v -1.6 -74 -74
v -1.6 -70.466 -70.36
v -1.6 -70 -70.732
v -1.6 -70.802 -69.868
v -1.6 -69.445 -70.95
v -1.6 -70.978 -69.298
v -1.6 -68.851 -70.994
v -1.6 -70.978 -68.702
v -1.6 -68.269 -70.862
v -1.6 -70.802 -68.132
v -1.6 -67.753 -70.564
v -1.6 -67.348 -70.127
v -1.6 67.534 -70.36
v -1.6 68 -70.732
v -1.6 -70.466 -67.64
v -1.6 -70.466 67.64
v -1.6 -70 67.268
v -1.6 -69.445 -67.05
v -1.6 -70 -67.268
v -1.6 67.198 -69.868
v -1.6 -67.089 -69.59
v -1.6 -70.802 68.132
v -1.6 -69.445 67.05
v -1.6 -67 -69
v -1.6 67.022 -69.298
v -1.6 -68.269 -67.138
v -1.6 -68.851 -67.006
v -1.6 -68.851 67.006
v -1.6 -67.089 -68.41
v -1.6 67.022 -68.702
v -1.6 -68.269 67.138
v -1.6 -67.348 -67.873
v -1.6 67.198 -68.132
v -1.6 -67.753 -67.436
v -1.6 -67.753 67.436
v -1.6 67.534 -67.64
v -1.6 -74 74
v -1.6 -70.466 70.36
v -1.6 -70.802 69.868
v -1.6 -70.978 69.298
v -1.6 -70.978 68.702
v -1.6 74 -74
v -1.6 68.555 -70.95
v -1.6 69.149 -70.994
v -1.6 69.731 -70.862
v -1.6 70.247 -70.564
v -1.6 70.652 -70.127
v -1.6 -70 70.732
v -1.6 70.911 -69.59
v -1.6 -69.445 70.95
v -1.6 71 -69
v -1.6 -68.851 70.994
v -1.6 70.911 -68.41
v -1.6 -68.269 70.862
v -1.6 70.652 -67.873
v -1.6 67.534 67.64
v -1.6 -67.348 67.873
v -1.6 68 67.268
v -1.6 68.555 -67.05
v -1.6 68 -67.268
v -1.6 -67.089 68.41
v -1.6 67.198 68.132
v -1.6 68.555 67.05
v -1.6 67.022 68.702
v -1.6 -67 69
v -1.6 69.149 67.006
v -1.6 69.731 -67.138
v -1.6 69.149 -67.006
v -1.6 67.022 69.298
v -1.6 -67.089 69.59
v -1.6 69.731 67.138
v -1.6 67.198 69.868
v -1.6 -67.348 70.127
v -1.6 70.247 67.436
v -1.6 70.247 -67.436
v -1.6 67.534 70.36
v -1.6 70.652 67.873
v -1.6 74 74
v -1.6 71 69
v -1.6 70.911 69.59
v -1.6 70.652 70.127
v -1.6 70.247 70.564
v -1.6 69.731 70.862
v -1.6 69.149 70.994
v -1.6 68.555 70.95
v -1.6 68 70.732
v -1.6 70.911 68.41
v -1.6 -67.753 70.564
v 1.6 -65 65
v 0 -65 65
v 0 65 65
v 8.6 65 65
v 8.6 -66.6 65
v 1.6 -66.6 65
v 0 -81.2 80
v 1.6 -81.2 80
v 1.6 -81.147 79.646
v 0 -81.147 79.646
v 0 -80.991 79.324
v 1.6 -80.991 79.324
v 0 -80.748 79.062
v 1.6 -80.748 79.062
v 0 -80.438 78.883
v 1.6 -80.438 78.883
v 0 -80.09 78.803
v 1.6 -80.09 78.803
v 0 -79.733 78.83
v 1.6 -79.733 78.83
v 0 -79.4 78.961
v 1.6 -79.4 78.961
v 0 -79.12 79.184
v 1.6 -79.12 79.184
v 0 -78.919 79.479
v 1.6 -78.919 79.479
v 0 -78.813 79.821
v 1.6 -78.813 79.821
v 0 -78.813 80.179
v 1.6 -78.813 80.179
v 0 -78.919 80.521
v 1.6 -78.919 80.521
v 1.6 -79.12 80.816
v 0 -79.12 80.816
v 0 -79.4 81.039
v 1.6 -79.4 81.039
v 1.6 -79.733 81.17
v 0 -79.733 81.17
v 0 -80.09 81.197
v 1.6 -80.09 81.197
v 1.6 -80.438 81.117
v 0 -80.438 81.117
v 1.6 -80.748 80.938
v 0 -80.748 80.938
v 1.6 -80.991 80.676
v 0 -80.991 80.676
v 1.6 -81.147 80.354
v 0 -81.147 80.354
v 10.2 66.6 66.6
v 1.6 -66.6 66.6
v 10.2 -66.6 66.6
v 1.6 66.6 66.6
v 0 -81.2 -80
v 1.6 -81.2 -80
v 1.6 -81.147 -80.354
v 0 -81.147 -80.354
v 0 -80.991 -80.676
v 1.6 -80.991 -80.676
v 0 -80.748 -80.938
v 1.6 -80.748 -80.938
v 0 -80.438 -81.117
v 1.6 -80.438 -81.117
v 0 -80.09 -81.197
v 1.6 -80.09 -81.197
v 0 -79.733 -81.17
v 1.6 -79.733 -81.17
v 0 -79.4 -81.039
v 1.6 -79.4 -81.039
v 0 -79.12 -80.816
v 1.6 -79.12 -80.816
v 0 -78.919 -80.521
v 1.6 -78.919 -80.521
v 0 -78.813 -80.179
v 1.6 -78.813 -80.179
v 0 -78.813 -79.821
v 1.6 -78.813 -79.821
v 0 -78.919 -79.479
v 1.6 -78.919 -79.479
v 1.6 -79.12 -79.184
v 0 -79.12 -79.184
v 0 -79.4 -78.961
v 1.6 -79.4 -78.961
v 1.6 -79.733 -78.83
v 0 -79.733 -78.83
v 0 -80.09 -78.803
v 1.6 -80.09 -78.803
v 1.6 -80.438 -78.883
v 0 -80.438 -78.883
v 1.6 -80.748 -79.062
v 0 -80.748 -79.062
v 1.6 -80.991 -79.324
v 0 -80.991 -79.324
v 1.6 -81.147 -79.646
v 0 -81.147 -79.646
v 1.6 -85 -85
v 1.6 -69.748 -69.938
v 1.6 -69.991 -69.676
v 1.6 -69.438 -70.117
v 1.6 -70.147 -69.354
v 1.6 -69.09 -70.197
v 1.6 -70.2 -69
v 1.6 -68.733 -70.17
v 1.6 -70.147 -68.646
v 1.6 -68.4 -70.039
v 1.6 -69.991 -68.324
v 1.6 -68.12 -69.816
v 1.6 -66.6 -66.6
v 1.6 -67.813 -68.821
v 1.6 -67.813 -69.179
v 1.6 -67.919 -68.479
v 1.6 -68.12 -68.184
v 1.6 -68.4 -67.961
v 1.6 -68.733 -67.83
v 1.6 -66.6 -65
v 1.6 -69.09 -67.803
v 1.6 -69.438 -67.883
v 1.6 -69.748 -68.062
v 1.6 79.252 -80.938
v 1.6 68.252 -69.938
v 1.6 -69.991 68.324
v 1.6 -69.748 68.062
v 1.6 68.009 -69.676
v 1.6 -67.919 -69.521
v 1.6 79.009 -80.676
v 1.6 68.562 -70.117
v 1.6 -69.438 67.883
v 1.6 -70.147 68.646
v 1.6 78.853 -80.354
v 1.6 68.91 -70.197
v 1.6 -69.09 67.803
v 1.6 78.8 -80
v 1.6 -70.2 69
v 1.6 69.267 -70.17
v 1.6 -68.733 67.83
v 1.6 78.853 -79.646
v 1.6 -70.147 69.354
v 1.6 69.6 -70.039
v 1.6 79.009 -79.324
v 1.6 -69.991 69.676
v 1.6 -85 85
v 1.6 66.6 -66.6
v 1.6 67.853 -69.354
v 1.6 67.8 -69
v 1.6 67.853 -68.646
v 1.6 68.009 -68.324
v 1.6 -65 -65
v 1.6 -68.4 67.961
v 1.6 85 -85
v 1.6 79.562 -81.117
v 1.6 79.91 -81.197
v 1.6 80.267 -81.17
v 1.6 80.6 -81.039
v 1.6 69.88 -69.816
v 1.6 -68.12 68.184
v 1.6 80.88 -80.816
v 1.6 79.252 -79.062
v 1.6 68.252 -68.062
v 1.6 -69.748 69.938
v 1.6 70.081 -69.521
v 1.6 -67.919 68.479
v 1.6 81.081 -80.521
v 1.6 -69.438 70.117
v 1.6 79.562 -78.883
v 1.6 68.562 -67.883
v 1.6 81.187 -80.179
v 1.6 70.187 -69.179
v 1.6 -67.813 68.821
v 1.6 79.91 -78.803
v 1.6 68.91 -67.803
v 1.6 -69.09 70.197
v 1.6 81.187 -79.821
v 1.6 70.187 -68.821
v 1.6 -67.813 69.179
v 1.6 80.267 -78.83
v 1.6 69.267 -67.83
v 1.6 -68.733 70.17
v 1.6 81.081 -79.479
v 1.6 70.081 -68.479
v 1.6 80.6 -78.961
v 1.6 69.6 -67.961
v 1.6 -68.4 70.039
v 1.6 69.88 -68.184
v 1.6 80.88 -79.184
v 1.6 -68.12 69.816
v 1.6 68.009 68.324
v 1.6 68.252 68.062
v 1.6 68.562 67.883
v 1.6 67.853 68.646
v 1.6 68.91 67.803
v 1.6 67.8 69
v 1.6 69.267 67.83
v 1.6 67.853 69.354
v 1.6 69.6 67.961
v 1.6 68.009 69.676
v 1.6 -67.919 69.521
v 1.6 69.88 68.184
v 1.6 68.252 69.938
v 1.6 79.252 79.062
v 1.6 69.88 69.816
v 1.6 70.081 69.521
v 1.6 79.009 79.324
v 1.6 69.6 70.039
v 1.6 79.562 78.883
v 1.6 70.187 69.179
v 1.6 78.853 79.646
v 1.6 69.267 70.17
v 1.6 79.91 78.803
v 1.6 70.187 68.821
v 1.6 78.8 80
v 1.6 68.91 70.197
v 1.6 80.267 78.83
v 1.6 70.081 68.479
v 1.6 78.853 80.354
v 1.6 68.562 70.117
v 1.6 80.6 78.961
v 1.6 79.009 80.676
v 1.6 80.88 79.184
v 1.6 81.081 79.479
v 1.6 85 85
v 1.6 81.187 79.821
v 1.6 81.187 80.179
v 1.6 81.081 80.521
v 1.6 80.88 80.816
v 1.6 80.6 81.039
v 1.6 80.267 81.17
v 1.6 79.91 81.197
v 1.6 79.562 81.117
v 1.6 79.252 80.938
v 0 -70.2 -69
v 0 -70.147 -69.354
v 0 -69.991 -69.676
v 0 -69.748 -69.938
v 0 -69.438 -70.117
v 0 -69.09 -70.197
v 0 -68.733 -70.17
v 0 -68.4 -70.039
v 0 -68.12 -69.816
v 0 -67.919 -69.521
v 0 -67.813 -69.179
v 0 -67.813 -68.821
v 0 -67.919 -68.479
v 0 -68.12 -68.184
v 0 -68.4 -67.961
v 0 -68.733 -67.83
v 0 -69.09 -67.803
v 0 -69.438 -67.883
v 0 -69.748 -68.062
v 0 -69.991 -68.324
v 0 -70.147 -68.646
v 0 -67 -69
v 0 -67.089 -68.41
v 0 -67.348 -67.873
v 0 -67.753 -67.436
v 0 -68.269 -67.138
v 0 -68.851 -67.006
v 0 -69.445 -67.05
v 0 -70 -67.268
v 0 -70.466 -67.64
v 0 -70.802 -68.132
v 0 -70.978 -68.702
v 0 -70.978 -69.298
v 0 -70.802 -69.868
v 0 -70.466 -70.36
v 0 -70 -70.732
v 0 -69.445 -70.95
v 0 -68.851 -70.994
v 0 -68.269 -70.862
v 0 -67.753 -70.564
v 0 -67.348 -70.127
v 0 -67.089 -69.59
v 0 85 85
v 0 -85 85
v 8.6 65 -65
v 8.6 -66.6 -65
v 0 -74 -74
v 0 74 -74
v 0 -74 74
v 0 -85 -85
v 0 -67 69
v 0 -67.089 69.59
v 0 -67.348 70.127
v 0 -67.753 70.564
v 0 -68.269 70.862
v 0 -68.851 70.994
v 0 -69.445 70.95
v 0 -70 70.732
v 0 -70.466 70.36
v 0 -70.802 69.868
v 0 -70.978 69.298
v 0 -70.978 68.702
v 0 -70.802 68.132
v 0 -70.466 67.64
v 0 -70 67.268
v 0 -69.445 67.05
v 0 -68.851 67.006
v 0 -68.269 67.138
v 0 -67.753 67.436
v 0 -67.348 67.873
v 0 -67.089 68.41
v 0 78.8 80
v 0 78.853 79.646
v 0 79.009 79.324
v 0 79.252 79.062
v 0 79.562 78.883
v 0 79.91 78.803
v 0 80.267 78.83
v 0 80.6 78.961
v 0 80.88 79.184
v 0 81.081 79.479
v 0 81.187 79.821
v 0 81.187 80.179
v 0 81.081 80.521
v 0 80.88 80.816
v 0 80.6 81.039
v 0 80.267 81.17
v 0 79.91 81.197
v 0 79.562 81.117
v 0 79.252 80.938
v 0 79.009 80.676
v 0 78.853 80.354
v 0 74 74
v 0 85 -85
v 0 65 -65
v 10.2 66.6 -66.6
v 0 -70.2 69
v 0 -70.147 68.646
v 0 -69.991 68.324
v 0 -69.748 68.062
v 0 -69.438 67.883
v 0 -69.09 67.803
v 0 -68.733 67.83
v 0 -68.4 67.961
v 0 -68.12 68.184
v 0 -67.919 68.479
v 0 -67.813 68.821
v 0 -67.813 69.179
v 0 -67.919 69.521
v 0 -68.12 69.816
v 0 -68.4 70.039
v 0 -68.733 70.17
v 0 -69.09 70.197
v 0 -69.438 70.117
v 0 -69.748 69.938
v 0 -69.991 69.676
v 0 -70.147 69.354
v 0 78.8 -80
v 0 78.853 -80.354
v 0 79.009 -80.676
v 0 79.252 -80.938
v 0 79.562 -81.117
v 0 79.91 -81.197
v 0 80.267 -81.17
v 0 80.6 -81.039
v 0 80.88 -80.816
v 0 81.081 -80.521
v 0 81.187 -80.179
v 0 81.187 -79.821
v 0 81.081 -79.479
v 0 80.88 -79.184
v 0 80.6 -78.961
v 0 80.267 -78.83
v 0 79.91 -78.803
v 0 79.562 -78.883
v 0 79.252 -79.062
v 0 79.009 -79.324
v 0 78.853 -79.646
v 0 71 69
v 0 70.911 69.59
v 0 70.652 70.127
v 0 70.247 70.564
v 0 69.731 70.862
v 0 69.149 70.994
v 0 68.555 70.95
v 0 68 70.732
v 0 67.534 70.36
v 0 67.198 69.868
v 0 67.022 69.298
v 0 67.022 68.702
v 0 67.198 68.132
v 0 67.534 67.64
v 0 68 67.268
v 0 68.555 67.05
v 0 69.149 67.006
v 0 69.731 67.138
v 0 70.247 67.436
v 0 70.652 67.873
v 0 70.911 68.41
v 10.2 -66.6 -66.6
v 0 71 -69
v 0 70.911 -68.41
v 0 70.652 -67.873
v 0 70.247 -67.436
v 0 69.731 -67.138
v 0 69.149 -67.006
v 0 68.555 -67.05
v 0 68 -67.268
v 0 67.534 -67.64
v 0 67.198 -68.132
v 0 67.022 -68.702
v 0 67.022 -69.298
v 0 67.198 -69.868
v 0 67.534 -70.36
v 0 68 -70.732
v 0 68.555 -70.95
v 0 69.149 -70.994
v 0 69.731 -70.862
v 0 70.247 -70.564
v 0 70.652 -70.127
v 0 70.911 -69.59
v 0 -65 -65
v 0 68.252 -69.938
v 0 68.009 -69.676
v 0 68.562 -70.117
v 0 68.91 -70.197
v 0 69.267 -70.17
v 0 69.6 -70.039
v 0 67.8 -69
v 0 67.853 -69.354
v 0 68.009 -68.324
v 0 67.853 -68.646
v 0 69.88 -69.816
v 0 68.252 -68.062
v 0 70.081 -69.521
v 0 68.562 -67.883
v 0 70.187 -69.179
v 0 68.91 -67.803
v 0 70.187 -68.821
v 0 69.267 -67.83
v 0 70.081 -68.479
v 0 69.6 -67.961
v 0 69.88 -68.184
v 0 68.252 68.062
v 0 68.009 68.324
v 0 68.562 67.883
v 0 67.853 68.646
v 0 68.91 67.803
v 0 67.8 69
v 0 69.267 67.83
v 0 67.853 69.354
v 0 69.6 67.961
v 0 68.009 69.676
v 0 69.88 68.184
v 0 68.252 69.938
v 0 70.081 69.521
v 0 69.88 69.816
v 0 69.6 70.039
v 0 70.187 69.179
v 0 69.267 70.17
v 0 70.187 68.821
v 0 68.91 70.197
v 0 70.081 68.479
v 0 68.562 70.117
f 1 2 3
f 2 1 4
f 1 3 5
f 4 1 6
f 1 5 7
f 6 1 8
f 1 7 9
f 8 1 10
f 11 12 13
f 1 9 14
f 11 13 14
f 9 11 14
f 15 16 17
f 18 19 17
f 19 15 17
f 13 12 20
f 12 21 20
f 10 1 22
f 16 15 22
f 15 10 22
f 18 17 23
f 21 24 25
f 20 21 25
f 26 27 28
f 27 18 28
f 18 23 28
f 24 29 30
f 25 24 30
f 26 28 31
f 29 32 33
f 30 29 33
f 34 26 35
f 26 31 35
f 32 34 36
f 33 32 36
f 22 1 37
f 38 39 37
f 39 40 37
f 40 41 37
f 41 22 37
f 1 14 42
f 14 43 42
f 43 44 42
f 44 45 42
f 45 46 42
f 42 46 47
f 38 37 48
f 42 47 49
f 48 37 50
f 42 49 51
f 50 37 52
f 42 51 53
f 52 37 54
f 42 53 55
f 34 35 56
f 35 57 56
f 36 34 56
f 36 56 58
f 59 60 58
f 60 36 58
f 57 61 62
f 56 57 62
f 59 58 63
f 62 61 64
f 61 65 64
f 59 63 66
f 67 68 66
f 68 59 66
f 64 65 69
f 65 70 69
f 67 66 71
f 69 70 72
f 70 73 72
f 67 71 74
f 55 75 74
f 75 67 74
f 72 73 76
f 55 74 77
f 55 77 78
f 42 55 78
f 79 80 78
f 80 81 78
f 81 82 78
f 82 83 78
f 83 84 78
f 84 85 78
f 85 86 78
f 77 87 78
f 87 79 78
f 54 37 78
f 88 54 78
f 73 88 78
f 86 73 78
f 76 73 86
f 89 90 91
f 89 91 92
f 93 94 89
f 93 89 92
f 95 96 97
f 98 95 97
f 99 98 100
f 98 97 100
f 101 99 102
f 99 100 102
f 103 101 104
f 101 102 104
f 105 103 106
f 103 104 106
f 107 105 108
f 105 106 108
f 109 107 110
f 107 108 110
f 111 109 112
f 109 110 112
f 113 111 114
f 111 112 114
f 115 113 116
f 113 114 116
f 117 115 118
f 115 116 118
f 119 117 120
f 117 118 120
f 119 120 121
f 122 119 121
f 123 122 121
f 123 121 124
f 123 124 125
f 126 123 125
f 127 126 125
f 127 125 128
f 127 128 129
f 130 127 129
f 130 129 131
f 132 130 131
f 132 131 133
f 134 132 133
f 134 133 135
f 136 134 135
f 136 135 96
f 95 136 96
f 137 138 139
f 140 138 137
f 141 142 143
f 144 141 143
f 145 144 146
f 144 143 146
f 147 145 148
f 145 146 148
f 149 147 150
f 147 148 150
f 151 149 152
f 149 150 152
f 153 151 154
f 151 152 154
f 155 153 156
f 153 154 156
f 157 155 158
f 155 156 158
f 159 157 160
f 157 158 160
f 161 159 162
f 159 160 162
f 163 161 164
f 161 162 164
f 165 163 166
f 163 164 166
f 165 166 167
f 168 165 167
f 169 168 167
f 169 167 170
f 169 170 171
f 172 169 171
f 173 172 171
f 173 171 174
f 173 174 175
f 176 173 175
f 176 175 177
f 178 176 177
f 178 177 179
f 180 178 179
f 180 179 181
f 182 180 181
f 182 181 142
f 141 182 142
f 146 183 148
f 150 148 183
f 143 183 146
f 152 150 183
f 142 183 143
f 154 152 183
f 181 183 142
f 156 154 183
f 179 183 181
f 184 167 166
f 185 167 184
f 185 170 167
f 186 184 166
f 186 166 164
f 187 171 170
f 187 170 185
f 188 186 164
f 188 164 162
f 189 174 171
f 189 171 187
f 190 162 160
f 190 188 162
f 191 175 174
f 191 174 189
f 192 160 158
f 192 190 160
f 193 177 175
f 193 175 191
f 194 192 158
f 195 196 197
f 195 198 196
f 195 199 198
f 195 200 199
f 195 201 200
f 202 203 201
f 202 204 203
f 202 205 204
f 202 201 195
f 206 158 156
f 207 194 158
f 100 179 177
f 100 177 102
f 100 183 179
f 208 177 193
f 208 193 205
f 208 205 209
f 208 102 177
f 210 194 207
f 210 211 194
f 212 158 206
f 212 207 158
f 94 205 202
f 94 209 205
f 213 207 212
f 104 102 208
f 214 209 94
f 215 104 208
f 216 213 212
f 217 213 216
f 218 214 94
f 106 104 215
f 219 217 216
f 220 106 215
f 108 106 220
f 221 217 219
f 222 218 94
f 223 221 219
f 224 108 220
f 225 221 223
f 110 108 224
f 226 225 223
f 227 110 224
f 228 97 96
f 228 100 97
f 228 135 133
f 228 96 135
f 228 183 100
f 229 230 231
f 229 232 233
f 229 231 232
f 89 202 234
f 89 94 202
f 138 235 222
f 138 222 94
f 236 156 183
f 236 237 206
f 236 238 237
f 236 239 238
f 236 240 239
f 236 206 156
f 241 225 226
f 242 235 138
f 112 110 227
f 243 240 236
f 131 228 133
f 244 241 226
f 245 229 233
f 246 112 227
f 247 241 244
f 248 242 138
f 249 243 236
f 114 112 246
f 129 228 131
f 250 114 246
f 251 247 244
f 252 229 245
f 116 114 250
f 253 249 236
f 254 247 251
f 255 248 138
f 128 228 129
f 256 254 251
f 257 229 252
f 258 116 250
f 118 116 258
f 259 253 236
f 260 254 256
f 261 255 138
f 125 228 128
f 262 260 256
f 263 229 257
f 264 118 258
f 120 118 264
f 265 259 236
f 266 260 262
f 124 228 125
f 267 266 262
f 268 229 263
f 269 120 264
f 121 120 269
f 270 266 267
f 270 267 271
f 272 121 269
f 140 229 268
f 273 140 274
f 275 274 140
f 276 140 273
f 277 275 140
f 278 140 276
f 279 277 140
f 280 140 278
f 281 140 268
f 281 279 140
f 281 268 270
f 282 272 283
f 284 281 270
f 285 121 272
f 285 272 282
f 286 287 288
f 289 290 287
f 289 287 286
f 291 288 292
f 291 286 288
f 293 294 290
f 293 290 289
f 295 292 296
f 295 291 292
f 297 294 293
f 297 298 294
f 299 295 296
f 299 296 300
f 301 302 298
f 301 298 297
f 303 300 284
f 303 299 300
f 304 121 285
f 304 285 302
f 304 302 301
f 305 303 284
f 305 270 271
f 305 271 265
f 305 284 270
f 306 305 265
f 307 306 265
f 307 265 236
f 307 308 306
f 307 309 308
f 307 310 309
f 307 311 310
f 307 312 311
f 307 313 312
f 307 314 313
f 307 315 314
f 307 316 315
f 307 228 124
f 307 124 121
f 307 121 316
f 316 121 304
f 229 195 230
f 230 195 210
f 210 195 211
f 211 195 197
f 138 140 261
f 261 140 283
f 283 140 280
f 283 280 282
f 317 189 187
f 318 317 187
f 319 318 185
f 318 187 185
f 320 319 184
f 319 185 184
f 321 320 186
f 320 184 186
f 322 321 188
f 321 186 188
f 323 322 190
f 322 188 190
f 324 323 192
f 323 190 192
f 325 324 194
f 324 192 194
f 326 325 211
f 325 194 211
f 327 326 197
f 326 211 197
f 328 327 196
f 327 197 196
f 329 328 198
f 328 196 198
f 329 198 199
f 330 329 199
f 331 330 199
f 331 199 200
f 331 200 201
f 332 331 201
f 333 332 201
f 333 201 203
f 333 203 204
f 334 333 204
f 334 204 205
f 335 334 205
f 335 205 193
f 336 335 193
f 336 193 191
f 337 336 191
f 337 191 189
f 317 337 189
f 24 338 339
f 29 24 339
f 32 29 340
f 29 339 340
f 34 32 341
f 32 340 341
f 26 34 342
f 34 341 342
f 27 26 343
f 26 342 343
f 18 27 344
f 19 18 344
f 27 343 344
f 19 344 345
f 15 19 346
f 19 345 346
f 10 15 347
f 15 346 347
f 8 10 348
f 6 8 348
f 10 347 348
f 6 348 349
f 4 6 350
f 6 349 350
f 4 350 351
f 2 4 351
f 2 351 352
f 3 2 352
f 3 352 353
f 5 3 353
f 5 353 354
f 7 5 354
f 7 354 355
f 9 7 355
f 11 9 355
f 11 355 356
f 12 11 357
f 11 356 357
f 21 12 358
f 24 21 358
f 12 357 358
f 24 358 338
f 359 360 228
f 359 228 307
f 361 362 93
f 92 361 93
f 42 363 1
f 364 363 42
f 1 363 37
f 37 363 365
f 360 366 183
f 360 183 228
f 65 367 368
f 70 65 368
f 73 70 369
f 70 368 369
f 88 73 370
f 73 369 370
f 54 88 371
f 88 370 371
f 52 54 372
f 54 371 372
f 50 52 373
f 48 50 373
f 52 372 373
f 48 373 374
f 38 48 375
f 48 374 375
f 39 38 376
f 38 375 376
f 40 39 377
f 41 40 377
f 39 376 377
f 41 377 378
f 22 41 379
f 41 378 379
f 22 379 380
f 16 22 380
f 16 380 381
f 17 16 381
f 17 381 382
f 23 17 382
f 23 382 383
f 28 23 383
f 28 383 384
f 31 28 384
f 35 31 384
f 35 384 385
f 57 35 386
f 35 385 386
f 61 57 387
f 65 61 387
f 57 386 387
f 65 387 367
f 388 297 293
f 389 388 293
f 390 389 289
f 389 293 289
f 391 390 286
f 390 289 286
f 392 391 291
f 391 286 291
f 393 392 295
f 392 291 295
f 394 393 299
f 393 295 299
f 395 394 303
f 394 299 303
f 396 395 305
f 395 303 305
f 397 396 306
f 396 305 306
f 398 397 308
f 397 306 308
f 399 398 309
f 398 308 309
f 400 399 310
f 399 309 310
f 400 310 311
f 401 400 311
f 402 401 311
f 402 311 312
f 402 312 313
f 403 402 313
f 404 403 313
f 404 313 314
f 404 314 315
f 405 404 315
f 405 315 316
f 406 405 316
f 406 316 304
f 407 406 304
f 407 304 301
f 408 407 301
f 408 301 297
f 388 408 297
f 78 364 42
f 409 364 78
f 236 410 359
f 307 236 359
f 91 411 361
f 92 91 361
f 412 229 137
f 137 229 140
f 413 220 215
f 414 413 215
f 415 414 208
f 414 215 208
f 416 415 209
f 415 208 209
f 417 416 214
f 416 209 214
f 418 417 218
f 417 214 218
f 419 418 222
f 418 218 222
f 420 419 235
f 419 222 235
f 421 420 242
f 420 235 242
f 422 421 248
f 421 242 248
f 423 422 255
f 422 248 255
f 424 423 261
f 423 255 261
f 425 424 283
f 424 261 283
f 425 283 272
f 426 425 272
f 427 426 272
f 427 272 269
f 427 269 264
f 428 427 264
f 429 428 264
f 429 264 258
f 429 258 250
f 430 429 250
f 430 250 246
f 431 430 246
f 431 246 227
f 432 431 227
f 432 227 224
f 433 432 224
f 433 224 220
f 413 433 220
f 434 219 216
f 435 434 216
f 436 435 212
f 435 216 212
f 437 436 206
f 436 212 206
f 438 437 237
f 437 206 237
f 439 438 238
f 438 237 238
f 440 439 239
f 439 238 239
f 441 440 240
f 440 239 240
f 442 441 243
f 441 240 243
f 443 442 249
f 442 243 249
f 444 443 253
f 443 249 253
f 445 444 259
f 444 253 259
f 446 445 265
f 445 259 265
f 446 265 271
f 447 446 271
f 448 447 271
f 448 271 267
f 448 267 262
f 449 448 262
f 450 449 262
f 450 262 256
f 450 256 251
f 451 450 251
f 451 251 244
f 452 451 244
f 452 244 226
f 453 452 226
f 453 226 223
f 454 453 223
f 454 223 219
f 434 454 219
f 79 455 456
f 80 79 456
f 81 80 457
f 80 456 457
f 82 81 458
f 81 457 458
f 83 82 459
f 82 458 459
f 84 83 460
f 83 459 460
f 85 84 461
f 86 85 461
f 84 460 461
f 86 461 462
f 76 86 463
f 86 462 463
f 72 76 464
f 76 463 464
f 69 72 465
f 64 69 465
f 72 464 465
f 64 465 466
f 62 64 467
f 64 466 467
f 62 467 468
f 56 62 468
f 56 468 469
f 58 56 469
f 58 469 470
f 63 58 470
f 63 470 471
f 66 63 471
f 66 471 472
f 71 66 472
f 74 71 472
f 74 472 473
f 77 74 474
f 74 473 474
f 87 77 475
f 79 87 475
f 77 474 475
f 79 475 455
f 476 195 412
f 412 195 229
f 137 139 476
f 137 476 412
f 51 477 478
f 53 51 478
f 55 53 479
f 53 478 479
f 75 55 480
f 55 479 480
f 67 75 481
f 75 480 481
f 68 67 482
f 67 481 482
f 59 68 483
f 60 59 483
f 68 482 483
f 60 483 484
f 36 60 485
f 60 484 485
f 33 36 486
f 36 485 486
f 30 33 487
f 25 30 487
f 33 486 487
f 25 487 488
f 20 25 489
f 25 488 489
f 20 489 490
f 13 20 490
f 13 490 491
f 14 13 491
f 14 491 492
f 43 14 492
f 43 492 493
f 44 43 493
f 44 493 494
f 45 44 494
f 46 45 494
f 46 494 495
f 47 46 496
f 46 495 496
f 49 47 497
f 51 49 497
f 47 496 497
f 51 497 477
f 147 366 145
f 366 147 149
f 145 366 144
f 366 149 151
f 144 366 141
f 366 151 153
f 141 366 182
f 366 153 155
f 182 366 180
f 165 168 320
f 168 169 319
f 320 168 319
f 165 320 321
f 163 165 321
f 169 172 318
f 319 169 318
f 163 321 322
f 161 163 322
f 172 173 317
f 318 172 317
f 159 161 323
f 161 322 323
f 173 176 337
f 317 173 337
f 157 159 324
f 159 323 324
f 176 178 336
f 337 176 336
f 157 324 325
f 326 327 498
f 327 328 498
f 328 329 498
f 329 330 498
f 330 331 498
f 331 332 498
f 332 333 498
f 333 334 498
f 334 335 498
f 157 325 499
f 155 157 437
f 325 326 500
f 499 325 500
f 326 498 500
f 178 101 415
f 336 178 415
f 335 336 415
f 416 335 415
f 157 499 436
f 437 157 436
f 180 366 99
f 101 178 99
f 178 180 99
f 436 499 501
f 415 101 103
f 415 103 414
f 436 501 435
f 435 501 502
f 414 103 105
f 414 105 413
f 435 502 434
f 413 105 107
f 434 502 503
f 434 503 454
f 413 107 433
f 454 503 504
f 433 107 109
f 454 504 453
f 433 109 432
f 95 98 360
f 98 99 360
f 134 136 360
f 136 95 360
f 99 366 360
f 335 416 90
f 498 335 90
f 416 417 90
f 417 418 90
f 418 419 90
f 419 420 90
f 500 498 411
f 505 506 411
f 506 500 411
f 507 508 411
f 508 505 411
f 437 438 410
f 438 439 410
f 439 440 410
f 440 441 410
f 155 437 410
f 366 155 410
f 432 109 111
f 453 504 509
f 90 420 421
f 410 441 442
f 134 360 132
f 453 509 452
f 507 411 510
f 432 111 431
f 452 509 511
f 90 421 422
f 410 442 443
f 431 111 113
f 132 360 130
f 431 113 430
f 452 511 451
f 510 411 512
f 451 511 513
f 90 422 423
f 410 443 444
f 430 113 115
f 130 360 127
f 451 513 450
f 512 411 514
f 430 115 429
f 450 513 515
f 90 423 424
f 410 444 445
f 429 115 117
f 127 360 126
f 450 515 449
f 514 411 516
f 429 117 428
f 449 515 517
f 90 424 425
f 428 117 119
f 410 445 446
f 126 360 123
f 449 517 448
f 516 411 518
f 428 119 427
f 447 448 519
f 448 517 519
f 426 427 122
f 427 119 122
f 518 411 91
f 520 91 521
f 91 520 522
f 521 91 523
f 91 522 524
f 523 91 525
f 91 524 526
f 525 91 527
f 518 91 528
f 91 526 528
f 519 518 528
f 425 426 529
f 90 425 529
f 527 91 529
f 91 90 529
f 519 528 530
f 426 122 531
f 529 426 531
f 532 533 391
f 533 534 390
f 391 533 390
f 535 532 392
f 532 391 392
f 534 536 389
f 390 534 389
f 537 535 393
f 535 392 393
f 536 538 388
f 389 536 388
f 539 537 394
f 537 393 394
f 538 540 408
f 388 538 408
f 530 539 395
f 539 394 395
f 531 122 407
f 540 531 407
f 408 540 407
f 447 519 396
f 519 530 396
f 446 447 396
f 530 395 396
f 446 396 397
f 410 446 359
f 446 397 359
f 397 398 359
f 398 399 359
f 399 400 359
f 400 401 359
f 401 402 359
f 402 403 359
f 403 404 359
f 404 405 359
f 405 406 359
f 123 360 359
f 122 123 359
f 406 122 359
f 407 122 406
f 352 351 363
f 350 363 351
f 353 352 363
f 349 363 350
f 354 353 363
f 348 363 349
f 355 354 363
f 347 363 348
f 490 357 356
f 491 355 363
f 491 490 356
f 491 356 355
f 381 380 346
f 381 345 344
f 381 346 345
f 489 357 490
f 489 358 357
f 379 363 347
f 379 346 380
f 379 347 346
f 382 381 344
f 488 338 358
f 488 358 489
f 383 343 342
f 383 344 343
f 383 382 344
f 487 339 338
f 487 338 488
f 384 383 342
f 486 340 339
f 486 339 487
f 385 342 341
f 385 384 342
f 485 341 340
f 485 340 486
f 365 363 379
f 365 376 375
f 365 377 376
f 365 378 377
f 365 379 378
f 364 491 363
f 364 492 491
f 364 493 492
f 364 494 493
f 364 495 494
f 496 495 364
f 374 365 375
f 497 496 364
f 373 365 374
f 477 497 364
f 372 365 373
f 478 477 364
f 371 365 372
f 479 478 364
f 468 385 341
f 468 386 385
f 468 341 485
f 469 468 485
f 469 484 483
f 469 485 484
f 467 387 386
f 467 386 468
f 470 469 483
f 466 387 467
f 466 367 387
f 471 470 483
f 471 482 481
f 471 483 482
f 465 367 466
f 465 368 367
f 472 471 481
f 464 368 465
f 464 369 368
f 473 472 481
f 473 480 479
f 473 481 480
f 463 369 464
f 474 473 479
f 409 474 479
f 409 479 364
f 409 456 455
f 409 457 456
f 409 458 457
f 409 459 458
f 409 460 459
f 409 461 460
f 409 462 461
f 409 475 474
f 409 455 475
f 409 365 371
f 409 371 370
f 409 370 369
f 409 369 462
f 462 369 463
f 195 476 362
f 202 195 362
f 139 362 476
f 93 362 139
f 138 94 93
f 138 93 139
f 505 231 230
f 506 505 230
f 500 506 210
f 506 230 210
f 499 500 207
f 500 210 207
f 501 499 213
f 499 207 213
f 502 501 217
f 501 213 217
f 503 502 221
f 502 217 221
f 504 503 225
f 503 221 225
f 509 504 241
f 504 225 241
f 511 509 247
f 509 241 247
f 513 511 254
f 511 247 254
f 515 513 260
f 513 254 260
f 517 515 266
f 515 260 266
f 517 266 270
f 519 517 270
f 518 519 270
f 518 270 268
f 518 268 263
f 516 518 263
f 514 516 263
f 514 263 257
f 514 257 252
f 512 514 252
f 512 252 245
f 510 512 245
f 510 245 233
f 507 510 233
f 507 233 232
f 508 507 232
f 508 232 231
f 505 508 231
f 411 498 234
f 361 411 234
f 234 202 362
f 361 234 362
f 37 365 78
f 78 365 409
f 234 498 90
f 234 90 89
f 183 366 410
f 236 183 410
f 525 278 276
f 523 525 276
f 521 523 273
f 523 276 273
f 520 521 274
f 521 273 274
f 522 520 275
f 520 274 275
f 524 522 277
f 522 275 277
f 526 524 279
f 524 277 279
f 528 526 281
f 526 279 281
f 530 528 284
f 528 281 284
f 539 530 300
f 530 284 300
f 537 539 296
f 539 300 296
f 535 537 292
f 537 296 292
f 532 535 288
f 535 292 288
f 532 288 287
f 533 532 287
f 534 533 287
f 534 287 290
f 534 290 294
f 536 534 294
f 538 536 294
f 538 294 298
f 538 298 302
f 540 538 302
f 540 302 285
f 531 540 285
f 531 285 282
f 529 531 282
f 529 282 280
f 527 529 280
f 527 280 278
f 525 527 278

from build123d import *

# Parameters (mm, degrees)
F0_W        = 170
F0_H        = 170
F0_W_2      = 133.2
F0_H_2      = 133.2
F1_DEPTH    = 1.6
F2_DEPTH    = 10.2
F3_T        = 1.6
F3_T3_DEPTH = 136.4
F3_T5_DEPTH = 136.4
F4_W        = 7
F4_H        = 130
F5_DEPTH    = 1.6
F6_D        = 2.4
F7_W        = 148
F7_H        = 148
F7_R        = 2
F8_DEPTH    = 1.6


# Not quite as in the source:
# - a shell that OpenCascade refuses in one call is made with other operations: the cavity is built on its own and cut out


with BuildPart() as f1:
    # F0 (on Right) → F1 (new body)
    with BuildSketch(Plane.YZ):
        Rectangle(F0_W, F0_H)
        Rectangle(F0_W_2, F0_H_2, mode=Mode.SUBTRACT)
    extrude(amount=F1_DEPTH)

    # F0 (on Right) → F2 (join)
    with BuildSketch(Plane.YZ):
        Rectangle(F0_W_2, F0_H_2)
    extrude(amount=F2_DEPTH)

    # F3: shell of thickness 1.6, made by hand


with BuildPart() as f3_core1:
    # F3_t2: copy of F1
    add(f1.part)

    # the walls: a layer under each face that stays
    f3_faces = [f3_core1.faces().sort_by_distance(p)[0] for p in [
        (0.8, 0, -85),
        (0.8, -85, 0),
        (0.8, 85, 0),
        (1.6, -72.8571428571, -72.8571428571),
        (0.8, 0, 85),
        (5.9, 66.6, 0),
        (5.9, 0, -66.6),
        (5.9, -66.6, 0),
        (5.9, 0, 66.6),
        (10.2, 0, 0),
    ]]
    thicken(f3_faces, amount=-F3_T, mode=Mode.SUBTRACT)

    # F3_s4 → F3_t3 (cut)
    with BuildSketch(Plane.XY.offset(-68.2)):
        Polygon((1.616, 66.616), (0, 66.6), (0, 65), (1.6, 65), align=None)
        Polygon((1.616, -66.616), (0, -66.6), (0, -65), (1.6, -65), align=None)
    extrude(amount=F3_T3_DEPTH, mode=Mode.SUBTRACT)

    # F3_s6 → F3_t5 (cut)
    with BuildSketch(Plane.XZ.offset(-68.2)):
        Polygon((1.616, -66.616), (0, -66.6), (0, -65), (1.6, -65), align=None)
        Polygon((1.616, 66.616), (0, 66.6), (0, 65), (1.6, 65), align=None)
    extrude(amount=F3_T5_DEPTH, mode=Mode.SUBTRACT)


with BuildPart() as f1_1:
    add(f1.part)

    # what is left inside the walls is the cavity
    f3_cavity = [f3_core1.part.solids().sort_by_distance(p)[0] for p in [
        (0.016, 0, -21.666667),
    ]]
    add(f3_cavity, mode=Mode.SUBTRACT)

    # F4 (on face) → F5 (cut, through all)
    with BuildSketch(Plane.XZ.offset(66.6)):
        with Locations((5.1, 0)):
            Rectangle(F4_W, F4_H)
    extrude(amount=-F5_DEPTH, mode=Mode.SUBTRACT)

    # F6 (through all)
    with Locations(Plane(origin=(0, 0, 0), x_dir=(0, 1, 0), z_dir=(-1, 0, 0))):
        with Locations((80, -80), (69, -69), (69, 69), (80, 80), (-69, 69), (-80, 80), (-80, -80), (-69, -69)):
            Hole(F6_D / 2)


with BuildPart() as f8:
    # F7 (on face) → F8 (new body)
    with BuildSketch(Plane.YZ):
        Rectangle(F7_W, F7_H)
        with Locations((-69, -69)):
            Circle(F7_R, mode=Mode.SUBTRACT)
        with Locations((69, -69)):
            Circle(F7_R, mode=Mode.SUBTRACT)
        with Locations((-69, 69)):
            Circle(F7_R, mode=Mode.SUBTRACT)
        with Locations((69, 69)):
            Circle(F7_R, mode=Mode.SUBTRACT)
    extrude(amount=-F8_DEPTH)


solid = Compound([f1_1.part, f8.part])
